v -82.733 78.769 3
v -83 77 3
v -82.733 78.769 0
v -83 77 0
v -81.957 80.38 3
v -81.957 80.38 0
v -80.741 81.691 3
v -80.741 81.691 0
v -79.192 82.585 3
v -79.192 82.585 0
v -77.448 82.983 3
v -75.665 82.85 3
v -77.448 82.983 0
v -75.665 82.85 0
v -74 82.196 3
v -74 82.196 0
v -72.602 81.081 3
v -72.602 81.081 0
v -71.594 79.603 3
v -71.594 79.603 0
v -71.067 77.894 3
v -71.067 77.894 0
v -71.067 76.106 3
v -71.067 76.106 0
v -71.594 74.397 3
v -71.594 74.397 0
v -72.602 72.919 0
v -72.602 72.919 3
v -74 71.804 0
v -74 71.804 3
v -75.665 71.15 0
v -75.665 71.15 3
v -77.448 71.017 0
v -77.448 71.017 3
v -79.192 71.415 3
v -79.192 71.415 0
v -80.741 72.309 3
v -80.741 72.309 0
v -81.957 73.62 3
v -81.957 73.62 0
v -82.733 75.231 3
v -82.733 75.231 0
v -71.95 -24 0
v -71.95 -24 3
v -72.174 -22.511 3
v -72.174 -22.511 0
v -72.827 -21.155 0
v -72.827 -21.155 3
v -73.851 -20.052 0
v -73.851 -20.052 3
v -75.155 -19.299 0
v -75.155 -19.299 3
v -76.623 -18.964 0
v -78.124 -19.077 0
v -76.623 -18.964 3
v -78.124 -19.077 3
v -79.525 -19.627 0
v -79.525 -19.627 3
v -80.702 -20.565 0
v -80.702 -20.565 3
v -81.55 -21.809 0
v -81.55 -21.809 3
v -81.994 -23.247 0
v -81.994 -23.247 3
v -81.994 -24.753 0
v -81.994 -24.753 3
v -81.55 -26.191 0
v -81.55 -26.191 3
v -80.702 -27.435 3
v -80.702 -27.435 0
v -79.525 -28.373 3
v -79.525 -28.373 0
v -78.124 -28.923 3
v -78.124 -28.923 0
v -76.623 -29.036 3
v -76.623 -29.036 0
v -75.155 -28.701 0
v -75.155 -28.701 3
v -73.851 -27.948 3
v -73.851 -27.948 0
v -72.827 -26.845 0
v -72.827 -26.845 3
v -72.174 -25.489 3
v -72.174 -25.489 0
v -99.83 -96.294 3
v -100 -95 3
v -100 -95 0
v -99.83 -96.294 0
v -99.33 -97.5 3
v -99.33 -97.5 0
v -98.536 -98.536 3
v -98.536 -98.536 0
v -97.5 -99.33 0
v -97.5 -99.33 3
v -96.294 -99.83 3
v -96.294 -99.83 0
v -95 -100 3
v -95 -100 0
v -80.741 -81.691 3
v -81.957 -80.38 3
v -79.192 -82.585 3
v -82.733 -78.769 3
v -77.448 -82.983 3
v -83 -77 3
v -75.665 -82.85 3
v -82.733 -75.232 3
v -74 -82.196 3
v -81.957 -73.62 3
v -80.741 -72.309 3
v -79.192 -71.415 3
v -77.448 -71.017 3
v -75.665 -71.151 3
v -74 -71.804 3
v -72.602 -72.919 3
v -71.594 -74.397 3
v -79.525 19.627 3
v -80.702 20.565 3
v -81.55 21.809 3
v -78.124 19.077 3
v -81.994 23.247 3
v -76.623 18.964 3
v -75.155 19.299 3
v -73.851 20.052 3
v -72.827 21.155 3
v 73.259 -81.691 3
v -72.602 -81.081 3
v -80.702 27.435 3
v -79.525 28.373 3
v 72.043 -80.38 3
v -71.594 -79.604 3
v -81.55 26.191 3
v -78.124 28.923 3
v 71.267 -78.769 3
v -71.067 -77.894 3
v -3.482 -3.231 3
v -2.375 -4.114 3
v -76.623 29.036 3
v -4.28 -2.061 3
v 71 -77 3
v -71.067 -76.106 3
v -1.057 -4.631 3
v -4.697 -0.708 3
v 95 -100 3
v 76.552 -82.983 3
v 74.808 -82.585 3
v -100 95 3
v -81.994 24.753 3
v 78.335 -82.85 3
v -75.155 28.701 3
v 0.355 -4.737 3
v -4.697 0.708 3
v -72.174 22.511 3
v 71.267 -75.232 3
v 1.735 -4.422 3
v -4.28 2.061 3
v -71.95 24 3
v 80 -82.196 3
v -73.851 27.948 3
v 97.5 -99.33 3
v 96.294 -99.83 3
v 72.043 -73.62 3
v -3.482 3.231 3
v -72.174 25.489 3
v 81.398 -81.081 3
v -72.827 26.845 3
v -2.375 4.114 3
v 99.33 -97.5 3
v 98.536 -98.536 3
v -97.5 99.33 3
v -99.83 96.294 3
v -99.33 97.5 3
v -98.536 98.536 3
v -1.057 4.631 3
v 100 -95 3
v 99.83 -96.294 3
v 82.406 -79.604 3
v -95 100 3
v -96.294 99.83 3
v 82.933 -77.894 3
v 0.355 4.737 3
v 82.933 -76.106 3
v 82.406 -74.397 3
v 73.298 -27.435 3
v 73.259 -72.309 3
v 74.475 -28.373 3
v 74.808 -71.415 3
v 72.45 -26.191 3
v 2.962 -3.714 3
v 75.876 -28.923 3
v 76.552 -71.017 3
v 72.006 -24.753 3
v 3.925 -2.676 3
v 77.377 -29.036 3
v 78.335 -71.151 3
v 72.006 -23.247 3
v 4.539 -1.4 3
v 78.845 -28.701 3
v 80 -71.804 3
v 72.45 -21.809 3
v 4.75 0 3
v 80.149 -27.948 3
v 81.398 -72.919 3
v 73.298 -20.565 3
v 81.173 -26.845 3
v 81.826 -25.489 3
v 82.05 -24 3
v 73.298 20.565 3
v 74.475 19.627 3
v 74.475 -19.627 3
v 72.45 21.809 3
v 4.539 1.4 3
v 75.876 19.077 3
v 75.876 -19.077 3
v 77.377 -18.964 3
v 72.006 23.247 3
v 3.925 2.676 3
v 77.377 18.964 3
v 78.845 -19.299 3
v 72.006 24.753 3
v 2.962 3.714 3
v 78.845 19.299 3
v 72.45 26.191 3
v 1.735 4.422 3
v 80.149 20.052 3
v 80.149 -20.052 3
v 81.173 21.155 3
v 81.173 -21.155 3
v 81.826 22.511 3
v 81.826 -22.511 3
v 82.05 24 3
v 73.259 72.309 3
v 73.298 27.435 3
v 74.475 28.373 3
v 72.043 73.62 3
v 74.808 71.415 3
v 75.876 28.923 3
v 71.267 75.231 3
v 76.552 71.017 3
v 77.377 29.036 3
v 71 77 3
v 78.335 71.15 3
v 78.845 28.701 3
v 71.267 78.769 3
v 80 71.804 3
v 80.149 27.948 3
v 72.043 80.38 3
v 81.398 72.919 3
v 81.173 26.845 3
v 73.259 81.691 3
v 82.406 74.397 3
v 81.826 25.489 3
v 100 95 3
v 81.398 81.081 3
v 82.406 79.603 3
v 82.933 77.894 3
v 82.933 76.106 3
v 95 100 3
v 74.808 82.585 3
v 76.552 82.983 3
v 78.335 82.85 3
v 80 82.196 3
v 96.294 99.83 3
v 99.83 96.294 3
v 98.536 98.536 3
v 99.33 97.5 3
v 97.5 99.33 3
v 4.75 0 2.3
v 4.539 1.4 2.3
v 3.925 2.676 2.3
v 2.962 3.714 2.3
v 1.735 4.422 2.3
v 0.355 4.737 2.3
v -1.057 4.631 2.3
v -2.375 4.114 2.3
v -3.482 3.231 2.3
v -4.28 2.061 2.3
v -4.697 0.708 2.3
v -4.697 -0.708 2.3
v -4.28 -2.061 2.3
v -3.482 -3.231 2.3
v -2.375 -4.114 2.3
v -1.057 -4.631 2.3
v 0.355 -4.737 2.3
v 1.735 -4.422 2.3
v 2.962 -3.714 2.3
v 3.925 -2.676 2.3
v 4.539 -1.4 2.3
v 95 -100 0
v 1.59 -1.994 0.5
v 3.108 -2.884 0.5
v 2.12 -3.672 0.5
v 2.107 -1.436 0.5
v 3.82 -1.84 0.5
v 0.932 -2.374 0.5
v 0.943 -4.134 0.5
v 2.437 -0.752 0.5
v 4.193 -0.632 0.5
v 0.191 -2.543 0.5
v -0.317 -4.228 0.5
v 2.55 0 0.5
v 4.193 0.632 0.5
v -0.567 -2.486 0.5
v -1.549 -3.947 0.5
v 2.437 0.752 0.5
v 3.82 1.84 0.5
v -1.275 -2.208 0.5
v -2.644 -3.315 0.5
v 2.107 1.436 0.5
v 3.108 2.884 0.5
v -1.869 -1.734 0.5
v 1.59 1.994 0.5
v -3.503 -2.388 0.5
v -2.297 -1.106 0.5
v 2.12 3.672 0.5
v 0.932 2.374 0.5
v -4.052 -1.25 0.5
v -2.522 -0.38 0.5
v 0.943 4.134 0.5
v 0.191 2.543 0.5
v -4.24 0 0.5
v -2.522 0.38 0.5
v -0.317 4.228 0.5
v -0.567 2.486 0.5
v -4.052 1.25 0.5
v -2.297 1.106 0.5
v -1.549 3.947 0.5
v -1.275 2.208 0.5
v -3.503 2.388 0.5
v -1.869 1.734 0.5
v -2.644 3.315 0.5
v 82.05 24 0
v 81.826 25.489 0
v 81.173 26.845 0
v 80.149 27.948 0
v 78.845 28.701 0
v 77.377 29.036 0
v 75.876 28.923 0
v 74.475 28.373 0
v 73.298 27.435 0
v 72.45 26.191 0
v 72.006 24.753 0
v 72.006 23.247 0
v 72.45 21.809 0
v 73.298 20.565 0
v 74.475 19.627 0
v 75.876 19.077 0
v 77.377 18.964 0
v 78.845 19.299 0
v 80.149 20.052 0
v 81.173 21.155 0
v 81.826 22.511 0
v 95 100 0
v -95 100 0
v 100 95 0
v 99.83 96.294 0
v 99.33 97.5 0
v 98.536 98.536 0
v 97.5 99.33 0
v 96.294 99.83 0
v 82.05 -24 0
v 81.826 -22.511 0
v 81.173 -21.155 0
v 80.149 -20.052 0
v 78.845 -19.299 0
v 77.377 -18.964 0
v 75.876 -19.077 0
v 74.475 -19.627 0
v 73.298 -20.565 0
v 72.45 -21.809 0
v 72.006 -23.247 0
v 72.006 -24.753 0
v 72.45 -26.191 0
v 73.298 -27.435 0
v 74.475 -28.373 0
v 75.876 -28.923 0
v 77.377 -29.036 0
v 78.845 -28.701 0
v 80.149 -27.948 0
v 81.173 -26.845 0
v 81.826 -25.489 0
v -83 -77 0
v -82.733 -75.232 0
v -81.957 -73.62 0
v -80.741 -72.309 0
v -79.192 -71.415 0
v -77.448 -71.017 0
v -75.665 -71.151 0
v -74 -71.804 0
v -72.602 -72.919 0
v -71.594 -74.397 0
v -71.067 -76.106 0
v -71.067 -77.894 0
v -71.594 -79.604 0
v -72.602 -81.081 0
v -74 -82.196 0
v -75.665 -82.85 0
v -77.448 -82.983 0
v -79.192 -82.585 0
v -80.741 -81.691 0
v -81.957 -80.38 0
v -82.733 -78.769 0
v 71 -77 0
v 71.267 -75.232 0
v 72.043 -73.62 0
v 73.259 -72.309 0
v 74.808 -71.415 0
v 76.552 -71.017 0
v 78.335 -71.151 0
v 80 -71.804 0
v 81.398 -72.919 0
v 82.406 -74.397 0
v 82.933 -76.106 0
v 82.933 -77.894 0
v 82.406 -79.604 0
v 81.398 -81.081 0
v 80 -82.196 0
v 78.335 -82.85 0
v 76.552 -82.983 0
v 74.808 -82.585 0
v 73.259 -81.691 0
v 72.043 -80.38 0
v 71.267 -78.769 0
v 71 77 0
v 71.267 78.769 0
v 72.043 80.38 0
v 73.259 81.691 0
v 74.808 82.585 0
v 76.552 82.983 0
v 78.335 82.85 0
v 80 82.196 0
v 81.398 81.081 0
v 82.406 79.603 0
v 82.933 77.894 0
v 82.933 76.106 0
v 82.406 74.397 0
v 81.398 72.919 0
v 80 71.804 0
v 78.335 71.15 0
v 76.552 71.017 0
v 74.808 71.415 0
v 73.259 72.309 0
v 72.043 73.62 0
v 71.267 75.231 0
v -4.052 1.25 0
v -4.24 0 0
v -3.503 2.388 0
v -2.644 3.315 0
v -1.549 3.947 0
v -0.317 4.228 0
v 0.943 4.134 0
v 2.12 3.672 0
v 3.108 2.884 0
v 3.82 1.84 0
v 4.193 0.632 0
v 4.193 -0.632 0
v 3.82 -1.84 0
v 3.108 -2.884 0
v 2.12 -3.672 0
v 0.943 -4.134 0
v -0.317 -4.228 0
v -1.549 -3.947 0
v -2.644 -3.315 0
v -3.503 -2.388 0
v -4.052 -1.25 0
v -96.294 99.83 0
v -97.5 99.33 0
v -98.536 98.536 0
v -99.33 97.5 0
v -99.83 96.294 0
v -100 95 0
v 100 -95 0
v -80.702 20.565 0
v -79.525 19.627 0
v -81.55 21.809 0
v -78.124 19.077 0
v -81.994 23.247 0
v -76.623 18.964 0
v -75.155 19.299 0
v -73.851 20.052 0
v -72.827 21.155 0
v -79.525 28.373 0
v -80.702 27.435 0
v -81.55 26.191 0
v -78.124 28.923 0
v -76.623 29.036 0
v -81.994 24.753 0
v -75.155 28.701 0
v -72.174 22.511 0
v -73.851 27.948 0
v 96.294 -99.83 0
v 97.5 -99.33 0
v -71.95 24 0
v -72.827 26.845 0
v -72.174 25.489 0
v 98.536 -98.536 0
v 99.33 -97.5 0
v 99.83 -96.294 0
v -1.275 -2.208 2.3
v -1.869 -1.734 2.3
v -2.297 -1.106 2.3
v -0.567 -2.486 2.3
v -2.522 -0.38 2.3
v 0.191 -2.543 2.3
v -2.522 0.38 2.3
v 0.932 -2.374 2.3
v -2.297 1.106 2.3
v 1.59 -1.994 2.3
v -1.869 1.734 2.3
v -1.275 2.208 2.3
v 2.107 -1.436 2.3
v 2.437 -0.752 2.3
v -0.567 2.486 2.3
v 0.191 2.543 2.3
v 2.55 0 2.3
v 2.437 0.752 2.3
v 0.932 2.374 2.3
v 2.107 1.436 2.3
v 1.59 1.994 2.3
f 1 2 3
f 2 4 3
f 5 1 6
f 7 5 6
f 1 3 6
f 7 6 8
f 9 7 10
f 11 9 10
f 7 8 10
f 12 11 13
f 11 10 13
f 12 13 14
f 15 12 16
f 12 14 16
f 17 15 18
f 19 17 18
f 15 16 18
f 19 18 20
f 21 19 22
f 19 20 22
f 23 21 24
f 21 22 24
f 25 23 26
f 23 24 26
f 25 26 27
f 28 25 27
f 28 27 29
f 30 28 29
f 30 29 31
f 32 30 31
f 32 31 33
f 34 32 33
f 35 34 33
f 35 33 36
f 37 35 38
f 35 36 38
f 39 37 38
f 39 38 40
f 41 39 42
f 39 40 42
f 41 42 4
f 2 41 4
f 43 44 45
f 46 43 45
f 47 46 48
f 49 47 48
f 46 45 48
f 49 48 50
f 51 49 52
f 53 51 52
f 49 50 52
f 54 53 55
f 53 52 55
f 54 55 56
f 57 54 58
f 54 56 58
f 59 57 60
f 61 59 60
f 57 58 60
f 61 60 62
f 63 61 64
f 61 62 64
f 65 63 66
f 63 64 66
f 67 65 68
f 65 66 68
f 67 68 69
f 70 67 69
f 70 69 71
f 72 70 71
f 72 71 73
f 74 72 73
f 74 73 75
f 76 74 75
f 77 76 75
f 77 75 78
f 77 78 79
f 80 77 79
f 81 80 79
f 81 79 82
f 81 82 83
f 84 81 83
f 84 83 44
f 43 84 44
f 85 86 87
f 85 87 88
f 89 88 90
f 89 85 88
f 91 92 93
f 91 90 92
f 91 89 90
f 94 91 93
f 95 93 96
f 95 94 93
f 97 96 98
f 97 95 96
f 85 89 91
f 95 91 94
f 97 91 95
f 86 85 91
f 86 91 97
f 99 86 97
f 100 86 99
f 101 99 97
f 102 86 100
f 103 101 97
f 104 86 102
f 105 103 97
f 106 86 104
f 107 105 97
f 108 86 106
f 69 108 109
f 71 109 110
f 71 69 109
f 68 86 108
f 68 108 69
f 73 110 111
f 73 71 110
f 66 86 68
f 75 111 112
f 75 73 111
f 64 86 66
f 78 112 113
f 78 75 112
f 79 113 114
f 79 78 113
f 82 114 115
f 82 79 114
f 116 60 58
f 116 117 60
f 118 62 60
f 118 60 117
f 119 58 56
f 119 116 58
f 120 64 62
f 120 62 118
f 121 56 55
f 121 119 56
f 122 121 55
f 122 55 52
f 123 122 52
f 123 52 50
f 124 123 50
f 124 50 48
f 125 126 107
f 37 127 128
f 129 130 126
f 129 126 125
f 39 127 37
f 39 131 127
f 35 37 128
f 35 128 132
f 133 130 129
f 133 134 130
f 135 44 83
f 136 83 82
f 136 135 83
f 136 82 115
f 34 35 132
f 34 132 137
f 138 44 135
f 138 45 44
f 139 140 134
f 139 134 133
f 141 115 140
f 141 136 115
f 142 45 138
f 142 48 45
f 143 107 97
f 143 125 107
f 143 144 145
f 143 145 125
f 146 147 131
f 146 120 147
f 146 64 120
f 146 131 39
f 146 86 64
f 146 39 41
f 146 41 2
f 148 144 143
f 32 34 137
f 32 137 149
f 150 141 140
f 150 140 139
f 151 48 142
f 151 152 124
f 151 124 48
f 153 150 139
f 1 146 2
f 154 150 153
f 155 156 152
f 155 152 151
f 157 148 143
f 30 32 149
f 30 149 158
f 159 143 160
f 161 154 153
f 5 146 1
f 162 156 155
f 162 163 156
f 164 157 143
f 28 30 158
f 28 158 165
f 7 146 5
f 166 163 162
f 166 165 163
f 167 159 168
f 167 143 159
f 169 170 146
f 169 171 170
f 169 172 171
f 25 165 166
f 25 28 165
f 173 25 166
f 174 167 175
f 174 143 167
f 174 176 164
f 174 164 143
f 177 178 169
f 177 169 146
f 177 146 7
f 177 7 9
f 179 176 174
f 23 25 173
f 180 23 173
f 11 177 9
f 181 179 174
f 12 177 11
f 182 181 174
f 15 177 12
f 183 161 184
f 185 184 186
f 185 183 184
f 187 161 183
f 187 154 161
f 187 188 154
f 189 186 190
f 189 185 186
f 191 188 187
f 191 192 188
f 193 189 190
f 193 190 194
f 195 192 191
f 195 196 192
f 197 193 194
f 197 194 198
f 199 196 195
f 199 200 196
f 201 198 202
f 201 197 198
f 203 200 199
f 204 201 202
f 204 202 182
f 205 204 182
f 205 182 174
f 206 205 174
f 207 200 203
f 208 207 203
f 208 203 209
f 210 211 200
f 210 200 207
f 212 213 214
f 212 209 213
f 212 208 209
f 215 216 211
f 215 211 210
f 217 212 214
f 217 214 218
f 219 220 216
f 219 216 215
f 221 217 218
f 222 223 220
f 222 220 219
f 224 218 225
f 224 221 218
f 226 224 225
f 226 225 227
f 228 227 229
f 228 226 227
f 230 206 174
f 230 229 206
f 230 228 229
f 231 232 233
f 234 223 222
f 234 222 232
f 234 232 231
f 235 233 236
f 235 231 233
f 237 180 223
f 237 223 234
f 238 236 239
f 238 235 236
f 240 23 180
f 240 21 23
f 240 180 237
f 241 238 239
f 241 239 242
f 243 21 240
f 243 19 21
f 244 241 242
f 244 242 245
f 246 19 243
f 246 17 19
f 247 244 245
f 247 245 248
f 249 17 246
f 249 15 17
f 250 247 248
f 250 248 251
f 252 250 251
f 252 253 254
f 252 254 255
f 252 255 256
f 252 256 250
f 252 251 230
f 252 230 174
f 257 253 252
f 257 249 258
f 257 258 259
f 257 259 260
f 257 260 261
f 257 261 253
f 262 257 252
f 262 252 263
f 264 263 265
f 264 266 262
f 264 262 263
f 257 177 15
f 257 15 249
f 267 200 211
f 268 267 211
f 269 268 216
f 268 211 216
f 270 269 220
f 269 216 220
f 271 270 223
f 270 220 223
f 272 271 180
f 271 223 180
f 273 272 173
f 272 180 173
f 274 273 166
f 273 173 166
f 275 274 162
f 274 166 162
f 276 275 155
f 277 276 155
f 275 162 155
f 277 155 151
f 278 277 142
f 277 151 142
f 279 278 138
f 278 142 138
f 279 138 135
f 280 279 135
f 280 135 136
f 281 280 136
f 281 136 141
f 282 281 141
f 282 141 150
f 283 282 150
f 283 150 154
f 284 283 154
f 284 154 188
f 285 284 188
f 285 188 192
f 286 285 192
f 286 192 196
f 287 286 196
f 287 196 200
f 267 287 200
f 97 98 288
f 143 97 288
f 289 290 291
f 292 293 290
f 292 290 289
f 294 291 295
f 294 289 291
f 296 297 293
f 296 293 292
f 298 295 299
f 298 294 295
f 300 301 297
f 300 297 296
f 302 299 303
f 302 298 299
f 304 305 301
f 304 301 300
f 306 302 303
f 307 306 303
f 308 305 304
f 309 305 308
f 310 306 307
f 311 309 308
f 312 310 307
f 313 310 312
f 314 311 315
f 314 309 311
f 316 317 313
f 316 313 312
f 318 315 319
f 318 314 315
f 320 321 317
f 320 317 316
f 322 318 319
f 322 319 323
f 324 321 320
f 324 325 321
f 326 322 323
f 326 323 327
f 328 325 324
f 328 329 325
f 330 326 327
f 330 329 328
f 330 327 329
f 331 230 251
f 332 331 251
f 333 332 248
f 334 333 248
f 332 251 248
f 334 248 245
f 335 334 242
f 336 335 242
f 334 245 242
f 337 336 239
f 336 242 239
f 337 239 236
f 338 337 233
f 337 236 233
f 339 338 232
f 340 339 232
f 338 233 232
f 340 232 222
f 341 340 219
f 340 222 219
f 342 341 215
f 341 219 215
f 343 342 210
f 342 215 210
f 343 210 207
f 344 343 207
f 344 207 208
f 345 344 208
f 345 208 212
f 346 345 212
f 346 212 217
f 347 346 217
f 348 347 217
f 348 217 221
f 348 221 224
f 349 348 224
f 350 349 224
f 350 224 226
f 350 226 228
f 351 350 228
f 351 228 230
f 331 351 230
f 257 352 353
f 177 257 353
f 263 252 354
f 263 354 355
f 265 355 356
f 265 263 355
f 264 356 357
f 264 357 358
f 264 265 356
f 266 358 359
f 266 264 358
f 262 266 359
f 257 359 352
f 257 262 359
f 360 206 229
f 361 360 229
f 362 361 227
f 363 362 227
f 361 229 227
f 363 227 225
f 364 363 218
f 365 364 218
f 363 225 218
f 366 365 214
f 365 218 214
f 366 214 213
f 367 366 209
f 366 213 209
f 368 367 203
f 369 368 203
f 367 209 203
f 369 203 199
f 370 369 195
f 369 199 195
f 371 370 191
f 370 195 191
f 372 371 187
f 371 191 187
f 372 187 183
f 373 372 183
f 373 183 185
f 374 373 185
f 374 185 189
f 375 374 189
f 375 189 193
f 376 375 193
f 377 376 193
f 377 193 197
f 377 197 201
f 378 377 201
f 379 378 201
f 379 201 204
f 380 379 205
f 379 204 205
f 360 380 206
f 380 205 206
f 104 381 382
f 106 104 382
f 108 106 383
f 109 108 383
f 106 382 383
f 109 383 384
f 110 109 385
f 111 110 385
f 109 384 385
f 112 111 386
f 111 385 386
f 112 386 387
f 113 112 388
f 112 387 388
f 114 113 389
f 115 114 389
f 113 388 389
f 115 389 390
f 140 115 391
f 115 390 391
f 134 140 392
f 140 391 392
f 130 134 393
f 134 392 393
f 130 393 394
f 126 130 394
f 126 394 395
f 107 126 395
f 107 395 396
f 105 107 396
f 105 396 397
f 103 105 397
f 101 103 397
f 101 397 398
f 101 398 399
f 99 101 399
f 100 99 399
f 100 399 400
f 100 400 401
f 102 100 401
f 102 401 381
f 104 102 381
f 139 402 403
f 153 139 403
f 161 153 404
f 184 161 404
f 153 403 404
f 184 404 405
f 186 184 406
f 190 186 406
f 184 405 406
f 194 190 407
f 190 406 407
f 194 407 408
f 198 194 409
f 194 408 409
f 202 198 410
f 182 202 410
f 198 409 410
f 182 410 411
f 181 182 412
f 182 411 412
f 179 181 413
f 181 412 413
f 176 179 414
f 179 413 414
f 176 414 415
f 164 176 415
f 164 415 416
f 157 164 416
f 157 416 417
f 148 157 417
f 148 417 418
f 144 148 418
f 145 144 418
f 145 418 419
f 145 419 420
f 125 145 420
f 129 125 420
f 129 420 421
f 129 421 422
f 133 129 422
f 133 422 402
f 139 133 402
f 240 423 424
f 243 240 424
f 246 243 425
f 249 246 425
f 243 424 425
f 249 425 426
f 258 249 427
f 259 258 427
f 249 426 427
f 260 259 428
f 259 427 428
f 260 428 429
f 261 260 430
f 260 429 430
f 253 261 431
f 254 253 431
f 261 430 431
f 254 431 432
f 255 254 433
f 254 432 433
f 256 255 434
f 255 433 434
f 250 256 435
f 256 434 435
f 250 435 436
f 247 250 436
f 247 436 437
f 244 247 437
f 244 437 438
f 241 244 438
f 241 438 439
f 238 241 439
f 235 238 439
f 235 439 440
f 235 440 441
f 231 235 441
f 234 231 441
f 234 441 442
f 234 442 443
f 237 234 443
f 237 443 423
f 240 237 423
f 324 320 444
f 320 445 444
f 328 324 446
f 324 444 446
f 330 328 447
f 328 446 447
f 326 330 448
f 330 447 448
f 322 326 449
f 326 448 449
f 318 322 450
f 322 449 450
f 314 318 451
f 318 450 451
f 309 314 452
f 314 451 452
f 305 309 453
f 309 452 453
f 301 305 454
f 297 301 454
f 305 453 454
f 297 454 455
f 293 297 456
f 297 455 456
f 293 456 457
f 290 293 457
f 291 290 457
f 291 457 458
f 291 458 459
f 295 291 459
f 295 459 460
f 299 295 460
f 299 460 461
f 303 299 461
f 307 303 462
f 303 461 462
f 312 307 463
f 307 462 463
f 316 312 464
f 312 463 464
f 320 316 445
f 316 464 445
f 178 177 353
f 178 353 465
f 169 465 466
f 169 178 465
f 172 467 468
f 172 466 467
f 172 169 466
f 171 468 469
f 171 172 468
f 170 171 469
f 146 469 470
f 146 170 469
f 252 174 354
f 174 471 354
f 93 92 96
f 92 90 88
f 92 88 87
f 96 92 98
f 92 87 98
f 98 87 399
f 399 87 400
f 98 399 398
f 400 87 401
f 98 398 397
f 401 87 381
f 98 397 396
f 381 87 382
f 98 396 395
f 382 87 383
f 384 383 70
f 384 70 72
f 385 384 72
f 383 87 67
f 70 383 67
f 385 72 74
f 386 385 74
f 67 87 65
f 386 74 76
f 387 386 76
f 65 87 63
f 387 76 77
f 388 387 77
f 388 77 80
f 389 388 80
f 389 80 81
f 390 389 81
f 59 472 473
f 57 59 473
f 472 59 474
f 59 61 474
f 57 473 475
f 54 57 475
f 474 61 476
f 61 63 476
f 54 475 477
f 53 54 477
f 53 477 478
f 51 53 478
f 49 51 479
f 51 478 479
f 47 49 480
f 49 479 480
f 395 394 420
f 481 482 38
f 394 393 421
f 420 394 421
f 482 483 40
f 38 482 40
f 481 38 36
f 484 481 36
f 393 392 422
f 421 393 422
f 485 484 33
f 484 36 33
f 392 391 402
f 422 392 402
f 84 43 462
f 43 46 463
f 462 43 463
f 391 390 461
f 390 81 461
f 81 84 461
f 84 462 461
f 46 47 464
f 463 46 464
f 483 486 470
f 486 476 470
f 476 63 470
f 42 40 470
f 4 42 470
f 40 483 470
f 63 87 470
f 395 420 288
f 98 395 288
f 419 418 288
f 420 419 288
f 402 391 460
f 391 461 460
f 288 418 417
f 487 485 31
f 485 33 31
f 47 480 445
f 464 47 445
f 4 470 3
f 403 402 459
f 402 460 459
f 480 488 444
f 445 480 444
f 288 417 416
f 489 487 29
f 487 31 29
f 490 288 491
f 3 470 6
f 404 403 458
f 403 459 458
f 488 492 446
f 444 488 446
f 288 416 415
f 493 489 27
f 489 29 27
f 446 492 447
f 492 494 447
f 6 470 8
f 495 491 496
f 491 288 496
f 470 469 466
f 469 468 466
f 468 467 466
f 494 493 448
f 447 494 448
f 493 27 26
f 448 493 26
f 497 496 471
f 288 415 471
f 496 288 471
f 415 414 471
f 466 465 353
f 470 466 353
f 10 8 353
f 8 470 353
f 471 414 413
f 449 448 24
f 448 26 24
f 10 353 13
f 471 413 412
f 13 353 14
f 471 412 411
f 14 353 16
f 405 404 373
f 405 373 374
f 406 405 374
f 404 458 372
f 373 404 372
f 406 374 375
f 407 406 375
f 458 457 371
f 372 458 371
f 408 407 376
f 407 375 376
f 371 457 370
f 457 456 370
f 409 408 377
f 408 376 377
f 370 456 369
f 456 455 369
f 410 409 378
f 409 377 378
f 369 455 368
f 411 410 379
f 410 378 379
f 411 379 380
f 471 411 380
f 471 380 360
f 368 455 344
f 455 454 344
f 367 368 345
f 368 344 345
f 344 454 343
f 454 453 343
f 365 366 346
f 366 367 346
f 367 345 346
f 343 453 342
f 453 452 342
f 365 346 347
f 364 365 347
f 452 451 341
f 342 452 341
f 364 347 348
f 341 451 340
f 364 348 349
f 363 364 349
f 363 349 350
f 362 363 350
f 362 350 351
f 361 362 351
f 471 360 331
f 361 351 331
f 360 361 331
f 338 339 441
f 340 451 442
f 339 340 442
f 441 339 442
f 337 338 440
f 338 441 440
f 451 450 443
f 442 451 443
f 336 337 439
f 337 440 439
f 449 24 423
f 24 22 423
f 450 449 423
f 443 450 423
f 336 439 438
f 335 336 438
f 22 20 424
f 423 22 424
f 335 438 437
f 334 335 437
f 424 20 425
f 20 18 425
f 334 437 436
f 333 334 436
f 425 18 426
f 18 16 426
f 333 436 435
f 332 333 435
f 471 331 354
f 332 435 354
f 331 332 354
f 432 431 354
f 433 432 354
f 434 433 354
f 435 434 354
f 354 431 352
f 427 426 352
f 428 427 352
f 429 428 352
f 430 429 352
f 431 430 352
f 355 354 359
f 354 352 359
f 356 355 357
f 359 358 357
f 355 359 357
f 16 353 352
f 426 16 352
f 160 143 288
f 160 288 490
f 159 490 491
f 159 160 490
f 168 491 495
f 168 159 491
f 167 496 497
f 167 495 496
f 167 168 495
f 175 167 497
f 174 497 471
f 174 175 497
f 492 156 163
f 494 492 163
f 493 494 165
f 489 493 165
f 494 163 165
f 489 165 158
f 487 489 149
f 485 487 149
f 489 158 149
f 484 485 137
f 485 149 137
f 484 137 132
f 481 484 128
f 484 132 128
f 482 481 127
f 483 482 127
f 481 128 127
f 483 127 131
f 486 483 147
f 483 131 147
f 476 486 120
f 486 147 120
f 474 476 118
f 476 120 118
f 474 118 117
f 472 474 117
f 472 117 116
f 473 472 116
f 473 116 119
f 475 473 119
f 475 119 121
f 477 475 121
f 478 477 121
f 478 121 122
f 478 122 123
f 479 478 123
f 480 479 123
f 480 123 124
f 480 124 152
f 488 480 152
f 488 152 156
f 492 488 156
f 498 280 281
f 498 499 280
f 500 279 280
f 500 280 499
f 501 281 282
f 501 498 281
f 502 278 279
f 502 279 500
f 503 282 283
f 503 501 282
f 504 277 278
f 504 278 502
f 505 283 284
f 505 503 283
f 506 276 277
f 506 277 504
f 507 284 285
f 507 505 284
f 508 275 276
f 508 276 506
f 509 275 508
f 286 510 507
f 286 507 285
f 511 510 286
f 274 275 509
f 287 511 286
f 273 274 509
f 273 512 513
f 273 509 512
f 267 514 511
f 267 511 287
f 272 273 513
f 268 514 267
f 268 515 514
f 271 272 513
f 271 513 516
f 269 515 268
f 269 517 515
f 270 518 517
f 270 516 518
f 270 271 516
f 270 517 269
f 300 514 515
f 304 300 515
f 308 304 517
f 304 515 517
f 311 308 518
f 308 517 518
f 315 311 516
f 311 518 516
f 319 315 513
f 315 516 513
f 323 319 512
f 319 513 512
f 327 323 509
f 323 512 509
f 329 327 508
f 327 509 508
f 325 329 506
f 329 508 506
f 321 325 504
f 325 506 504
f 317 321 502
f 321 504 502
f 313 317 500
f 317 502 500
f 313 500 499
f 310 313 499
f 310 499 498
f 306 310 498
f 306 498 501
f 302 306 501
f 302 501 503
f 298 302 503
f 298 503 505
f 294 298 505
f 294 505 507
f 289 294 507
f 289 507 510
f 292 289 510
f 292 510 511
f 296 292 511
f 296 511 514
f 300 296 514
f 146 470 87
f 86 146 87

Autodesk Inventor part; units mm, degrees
ref_plane "YZ Plane" through (0, 0, 0) normal (1, 0, 0) x (0, 1, 0)
ref_plane "XZ Plane" through (0, 0, 0) normal (0, 1, 0) x (-1, 0, 0)
ref_plane "XY Plane" through (0, 0, 0) normal (0, 0, 1) x (1, 0, 0)
sketch "Sketch1" plane through (0, 0, 0) normal (0, 0, 1) x (1, 0, 0)
  line L0 (100, 100) -> (-100, 100)
  line L1 (-100, 100) -> (-100, -100)
  line L2 (-100, -100) -> (100, -100)
  line L3 (100, -100) -> (100, 100)
  line L4 (100, 100) -> (-100, -100) construction
  line L5 (-100, 100) -> (100, -100) construction
  point P0 (0, 0)
  dimension "d0" = 200
  dimension "d1" = 200
extrude "Extrusion1" add sketch "Sketch1" along normal blind 3
fillet "Fillet1" radius 5 4 edges at (100, 100, 1.5) (-100, 100, 1.5) (100, -100, 1.5) (-100, -100, 1.5)
sketch "Sketch2" plane through (0, 0, 3) normal (0, 0, 1) x (1, 0, 0)
  circle A0 centre (0, 0) radius 2.55
  dimension "d5" = 5.1
extrude "Extrusion2" cut sketch "Sketch2" against normal blind 10
sketch "Sketch3" plane through (0, 0, 3) normal (0, 0, 1) x (1, 0, 0)
  circle A0 centre (0, 0) radius 4.75
  dimension "d10" = 9.5
extrude "Extrusion3" cut sketch "Sketch3" against normal blind 0.7
sketch "Sketch4" plane through (0, 0, 0) normal (0, 0, -1) x (-1, 0, 0)
  point P0 (0, 0)
sketch "Sketch5" plane through (0, 0, 0) normal (0, 0, -1) x (-1, 0, 0)
  point P0 (0, 0)
sketch "Sketch6" plane through (0, 0, 0) normal (0, 0, -1) x (-1, 0, 0)
  circle A0 centre (-77, 77) radius 6
  line L0 (-93.7439, 99.9999) -> (-93.7439, -0.0001)
  line L1 (-93.7439, -0.0001) -> (78.7368, -0.0001)
  circle A1 centre (-77, -77.0002) radius 6
  line L2 (95, -100) -> (-95, -100) projected
  line L3 (0, -100) -> (0, 48.6306)
  circle A2 centre (77, 77) radius 6
  circle A3 centre (77, -77.0002) radius 6
  line L4 (-95, 100) -> (95, 100) projected
  line L5 (-100, -95) -> (-100, 95) projected
  point P0 (0, 0)
  point P1 (-93.7439, 89.8675)
  point P2 (-93.7439, 85.1564)
  dimension "d11" = 12
  dimension "d13" = 100
  dimension "d22" = 23
  dimension "d23" = 23
extrude "Extrusion4" cut sketch "Sketch6" against normal blind 10
sketch "Sketch8" plane through (0, 0, 0) normal (0, 0, -1) x (-1, 0, 0)
  circle A0 centre (0, 0) radius 4.24
  dimension "d19" = 8.48
extrude "Extrusion6" cut sketch "Sketch8" against normal blind 0.5
ref_plane "Work Plane1" through (0, 0, 1.5) normal (0, 0, -1) x (-1, 0, 0)
ref_plane "Work Plane2" through (0.0302, -1.2496, -9.3454) normal (0, 0, -1) x (0.0242, -0.9997, 0)
sketch "Sketch9" plane through (0, 0, 3) normal (0, 0, 1) x (1, 0, 0)
  line L0 (-100, -40) -> (100, -40)
  line L1 (100, -40) -> (100, 40)
  line L2 (100, 40) -> (-100, 40)
  line L3 (-100, 40) -> (-100, -40)
  circle A0 centre (0, 0) radius 2.55 projected
  line L4 (-100, -40) -> (100, 40) construction
  line L5 (100, -40) -> (-100, 40) construction
  circle A1 centre (-77, 24) radius 5.05
  line L6 (0, 0) -> (0, 19)
  line L7 (0, 0) -> (22.4044, 0)
  circle A2 centre (77, 24) radius 5.05
  circle A3 centre (-77, -24) radius 5.05
  circle A4 centre (77, -24) radius 5.05
  dimension "d24" = 200
  dimension "d25" = 80
  dimension "d26" = 10.1
  dimension "d27" = 23
  dimension "d28" = 16
extrude "Extrusion7" cut sketch "Sketch9" against normal blind 10 contours A1 | A2 | A3 | A4
properties part number "Base" material "Aluminum 6061"
